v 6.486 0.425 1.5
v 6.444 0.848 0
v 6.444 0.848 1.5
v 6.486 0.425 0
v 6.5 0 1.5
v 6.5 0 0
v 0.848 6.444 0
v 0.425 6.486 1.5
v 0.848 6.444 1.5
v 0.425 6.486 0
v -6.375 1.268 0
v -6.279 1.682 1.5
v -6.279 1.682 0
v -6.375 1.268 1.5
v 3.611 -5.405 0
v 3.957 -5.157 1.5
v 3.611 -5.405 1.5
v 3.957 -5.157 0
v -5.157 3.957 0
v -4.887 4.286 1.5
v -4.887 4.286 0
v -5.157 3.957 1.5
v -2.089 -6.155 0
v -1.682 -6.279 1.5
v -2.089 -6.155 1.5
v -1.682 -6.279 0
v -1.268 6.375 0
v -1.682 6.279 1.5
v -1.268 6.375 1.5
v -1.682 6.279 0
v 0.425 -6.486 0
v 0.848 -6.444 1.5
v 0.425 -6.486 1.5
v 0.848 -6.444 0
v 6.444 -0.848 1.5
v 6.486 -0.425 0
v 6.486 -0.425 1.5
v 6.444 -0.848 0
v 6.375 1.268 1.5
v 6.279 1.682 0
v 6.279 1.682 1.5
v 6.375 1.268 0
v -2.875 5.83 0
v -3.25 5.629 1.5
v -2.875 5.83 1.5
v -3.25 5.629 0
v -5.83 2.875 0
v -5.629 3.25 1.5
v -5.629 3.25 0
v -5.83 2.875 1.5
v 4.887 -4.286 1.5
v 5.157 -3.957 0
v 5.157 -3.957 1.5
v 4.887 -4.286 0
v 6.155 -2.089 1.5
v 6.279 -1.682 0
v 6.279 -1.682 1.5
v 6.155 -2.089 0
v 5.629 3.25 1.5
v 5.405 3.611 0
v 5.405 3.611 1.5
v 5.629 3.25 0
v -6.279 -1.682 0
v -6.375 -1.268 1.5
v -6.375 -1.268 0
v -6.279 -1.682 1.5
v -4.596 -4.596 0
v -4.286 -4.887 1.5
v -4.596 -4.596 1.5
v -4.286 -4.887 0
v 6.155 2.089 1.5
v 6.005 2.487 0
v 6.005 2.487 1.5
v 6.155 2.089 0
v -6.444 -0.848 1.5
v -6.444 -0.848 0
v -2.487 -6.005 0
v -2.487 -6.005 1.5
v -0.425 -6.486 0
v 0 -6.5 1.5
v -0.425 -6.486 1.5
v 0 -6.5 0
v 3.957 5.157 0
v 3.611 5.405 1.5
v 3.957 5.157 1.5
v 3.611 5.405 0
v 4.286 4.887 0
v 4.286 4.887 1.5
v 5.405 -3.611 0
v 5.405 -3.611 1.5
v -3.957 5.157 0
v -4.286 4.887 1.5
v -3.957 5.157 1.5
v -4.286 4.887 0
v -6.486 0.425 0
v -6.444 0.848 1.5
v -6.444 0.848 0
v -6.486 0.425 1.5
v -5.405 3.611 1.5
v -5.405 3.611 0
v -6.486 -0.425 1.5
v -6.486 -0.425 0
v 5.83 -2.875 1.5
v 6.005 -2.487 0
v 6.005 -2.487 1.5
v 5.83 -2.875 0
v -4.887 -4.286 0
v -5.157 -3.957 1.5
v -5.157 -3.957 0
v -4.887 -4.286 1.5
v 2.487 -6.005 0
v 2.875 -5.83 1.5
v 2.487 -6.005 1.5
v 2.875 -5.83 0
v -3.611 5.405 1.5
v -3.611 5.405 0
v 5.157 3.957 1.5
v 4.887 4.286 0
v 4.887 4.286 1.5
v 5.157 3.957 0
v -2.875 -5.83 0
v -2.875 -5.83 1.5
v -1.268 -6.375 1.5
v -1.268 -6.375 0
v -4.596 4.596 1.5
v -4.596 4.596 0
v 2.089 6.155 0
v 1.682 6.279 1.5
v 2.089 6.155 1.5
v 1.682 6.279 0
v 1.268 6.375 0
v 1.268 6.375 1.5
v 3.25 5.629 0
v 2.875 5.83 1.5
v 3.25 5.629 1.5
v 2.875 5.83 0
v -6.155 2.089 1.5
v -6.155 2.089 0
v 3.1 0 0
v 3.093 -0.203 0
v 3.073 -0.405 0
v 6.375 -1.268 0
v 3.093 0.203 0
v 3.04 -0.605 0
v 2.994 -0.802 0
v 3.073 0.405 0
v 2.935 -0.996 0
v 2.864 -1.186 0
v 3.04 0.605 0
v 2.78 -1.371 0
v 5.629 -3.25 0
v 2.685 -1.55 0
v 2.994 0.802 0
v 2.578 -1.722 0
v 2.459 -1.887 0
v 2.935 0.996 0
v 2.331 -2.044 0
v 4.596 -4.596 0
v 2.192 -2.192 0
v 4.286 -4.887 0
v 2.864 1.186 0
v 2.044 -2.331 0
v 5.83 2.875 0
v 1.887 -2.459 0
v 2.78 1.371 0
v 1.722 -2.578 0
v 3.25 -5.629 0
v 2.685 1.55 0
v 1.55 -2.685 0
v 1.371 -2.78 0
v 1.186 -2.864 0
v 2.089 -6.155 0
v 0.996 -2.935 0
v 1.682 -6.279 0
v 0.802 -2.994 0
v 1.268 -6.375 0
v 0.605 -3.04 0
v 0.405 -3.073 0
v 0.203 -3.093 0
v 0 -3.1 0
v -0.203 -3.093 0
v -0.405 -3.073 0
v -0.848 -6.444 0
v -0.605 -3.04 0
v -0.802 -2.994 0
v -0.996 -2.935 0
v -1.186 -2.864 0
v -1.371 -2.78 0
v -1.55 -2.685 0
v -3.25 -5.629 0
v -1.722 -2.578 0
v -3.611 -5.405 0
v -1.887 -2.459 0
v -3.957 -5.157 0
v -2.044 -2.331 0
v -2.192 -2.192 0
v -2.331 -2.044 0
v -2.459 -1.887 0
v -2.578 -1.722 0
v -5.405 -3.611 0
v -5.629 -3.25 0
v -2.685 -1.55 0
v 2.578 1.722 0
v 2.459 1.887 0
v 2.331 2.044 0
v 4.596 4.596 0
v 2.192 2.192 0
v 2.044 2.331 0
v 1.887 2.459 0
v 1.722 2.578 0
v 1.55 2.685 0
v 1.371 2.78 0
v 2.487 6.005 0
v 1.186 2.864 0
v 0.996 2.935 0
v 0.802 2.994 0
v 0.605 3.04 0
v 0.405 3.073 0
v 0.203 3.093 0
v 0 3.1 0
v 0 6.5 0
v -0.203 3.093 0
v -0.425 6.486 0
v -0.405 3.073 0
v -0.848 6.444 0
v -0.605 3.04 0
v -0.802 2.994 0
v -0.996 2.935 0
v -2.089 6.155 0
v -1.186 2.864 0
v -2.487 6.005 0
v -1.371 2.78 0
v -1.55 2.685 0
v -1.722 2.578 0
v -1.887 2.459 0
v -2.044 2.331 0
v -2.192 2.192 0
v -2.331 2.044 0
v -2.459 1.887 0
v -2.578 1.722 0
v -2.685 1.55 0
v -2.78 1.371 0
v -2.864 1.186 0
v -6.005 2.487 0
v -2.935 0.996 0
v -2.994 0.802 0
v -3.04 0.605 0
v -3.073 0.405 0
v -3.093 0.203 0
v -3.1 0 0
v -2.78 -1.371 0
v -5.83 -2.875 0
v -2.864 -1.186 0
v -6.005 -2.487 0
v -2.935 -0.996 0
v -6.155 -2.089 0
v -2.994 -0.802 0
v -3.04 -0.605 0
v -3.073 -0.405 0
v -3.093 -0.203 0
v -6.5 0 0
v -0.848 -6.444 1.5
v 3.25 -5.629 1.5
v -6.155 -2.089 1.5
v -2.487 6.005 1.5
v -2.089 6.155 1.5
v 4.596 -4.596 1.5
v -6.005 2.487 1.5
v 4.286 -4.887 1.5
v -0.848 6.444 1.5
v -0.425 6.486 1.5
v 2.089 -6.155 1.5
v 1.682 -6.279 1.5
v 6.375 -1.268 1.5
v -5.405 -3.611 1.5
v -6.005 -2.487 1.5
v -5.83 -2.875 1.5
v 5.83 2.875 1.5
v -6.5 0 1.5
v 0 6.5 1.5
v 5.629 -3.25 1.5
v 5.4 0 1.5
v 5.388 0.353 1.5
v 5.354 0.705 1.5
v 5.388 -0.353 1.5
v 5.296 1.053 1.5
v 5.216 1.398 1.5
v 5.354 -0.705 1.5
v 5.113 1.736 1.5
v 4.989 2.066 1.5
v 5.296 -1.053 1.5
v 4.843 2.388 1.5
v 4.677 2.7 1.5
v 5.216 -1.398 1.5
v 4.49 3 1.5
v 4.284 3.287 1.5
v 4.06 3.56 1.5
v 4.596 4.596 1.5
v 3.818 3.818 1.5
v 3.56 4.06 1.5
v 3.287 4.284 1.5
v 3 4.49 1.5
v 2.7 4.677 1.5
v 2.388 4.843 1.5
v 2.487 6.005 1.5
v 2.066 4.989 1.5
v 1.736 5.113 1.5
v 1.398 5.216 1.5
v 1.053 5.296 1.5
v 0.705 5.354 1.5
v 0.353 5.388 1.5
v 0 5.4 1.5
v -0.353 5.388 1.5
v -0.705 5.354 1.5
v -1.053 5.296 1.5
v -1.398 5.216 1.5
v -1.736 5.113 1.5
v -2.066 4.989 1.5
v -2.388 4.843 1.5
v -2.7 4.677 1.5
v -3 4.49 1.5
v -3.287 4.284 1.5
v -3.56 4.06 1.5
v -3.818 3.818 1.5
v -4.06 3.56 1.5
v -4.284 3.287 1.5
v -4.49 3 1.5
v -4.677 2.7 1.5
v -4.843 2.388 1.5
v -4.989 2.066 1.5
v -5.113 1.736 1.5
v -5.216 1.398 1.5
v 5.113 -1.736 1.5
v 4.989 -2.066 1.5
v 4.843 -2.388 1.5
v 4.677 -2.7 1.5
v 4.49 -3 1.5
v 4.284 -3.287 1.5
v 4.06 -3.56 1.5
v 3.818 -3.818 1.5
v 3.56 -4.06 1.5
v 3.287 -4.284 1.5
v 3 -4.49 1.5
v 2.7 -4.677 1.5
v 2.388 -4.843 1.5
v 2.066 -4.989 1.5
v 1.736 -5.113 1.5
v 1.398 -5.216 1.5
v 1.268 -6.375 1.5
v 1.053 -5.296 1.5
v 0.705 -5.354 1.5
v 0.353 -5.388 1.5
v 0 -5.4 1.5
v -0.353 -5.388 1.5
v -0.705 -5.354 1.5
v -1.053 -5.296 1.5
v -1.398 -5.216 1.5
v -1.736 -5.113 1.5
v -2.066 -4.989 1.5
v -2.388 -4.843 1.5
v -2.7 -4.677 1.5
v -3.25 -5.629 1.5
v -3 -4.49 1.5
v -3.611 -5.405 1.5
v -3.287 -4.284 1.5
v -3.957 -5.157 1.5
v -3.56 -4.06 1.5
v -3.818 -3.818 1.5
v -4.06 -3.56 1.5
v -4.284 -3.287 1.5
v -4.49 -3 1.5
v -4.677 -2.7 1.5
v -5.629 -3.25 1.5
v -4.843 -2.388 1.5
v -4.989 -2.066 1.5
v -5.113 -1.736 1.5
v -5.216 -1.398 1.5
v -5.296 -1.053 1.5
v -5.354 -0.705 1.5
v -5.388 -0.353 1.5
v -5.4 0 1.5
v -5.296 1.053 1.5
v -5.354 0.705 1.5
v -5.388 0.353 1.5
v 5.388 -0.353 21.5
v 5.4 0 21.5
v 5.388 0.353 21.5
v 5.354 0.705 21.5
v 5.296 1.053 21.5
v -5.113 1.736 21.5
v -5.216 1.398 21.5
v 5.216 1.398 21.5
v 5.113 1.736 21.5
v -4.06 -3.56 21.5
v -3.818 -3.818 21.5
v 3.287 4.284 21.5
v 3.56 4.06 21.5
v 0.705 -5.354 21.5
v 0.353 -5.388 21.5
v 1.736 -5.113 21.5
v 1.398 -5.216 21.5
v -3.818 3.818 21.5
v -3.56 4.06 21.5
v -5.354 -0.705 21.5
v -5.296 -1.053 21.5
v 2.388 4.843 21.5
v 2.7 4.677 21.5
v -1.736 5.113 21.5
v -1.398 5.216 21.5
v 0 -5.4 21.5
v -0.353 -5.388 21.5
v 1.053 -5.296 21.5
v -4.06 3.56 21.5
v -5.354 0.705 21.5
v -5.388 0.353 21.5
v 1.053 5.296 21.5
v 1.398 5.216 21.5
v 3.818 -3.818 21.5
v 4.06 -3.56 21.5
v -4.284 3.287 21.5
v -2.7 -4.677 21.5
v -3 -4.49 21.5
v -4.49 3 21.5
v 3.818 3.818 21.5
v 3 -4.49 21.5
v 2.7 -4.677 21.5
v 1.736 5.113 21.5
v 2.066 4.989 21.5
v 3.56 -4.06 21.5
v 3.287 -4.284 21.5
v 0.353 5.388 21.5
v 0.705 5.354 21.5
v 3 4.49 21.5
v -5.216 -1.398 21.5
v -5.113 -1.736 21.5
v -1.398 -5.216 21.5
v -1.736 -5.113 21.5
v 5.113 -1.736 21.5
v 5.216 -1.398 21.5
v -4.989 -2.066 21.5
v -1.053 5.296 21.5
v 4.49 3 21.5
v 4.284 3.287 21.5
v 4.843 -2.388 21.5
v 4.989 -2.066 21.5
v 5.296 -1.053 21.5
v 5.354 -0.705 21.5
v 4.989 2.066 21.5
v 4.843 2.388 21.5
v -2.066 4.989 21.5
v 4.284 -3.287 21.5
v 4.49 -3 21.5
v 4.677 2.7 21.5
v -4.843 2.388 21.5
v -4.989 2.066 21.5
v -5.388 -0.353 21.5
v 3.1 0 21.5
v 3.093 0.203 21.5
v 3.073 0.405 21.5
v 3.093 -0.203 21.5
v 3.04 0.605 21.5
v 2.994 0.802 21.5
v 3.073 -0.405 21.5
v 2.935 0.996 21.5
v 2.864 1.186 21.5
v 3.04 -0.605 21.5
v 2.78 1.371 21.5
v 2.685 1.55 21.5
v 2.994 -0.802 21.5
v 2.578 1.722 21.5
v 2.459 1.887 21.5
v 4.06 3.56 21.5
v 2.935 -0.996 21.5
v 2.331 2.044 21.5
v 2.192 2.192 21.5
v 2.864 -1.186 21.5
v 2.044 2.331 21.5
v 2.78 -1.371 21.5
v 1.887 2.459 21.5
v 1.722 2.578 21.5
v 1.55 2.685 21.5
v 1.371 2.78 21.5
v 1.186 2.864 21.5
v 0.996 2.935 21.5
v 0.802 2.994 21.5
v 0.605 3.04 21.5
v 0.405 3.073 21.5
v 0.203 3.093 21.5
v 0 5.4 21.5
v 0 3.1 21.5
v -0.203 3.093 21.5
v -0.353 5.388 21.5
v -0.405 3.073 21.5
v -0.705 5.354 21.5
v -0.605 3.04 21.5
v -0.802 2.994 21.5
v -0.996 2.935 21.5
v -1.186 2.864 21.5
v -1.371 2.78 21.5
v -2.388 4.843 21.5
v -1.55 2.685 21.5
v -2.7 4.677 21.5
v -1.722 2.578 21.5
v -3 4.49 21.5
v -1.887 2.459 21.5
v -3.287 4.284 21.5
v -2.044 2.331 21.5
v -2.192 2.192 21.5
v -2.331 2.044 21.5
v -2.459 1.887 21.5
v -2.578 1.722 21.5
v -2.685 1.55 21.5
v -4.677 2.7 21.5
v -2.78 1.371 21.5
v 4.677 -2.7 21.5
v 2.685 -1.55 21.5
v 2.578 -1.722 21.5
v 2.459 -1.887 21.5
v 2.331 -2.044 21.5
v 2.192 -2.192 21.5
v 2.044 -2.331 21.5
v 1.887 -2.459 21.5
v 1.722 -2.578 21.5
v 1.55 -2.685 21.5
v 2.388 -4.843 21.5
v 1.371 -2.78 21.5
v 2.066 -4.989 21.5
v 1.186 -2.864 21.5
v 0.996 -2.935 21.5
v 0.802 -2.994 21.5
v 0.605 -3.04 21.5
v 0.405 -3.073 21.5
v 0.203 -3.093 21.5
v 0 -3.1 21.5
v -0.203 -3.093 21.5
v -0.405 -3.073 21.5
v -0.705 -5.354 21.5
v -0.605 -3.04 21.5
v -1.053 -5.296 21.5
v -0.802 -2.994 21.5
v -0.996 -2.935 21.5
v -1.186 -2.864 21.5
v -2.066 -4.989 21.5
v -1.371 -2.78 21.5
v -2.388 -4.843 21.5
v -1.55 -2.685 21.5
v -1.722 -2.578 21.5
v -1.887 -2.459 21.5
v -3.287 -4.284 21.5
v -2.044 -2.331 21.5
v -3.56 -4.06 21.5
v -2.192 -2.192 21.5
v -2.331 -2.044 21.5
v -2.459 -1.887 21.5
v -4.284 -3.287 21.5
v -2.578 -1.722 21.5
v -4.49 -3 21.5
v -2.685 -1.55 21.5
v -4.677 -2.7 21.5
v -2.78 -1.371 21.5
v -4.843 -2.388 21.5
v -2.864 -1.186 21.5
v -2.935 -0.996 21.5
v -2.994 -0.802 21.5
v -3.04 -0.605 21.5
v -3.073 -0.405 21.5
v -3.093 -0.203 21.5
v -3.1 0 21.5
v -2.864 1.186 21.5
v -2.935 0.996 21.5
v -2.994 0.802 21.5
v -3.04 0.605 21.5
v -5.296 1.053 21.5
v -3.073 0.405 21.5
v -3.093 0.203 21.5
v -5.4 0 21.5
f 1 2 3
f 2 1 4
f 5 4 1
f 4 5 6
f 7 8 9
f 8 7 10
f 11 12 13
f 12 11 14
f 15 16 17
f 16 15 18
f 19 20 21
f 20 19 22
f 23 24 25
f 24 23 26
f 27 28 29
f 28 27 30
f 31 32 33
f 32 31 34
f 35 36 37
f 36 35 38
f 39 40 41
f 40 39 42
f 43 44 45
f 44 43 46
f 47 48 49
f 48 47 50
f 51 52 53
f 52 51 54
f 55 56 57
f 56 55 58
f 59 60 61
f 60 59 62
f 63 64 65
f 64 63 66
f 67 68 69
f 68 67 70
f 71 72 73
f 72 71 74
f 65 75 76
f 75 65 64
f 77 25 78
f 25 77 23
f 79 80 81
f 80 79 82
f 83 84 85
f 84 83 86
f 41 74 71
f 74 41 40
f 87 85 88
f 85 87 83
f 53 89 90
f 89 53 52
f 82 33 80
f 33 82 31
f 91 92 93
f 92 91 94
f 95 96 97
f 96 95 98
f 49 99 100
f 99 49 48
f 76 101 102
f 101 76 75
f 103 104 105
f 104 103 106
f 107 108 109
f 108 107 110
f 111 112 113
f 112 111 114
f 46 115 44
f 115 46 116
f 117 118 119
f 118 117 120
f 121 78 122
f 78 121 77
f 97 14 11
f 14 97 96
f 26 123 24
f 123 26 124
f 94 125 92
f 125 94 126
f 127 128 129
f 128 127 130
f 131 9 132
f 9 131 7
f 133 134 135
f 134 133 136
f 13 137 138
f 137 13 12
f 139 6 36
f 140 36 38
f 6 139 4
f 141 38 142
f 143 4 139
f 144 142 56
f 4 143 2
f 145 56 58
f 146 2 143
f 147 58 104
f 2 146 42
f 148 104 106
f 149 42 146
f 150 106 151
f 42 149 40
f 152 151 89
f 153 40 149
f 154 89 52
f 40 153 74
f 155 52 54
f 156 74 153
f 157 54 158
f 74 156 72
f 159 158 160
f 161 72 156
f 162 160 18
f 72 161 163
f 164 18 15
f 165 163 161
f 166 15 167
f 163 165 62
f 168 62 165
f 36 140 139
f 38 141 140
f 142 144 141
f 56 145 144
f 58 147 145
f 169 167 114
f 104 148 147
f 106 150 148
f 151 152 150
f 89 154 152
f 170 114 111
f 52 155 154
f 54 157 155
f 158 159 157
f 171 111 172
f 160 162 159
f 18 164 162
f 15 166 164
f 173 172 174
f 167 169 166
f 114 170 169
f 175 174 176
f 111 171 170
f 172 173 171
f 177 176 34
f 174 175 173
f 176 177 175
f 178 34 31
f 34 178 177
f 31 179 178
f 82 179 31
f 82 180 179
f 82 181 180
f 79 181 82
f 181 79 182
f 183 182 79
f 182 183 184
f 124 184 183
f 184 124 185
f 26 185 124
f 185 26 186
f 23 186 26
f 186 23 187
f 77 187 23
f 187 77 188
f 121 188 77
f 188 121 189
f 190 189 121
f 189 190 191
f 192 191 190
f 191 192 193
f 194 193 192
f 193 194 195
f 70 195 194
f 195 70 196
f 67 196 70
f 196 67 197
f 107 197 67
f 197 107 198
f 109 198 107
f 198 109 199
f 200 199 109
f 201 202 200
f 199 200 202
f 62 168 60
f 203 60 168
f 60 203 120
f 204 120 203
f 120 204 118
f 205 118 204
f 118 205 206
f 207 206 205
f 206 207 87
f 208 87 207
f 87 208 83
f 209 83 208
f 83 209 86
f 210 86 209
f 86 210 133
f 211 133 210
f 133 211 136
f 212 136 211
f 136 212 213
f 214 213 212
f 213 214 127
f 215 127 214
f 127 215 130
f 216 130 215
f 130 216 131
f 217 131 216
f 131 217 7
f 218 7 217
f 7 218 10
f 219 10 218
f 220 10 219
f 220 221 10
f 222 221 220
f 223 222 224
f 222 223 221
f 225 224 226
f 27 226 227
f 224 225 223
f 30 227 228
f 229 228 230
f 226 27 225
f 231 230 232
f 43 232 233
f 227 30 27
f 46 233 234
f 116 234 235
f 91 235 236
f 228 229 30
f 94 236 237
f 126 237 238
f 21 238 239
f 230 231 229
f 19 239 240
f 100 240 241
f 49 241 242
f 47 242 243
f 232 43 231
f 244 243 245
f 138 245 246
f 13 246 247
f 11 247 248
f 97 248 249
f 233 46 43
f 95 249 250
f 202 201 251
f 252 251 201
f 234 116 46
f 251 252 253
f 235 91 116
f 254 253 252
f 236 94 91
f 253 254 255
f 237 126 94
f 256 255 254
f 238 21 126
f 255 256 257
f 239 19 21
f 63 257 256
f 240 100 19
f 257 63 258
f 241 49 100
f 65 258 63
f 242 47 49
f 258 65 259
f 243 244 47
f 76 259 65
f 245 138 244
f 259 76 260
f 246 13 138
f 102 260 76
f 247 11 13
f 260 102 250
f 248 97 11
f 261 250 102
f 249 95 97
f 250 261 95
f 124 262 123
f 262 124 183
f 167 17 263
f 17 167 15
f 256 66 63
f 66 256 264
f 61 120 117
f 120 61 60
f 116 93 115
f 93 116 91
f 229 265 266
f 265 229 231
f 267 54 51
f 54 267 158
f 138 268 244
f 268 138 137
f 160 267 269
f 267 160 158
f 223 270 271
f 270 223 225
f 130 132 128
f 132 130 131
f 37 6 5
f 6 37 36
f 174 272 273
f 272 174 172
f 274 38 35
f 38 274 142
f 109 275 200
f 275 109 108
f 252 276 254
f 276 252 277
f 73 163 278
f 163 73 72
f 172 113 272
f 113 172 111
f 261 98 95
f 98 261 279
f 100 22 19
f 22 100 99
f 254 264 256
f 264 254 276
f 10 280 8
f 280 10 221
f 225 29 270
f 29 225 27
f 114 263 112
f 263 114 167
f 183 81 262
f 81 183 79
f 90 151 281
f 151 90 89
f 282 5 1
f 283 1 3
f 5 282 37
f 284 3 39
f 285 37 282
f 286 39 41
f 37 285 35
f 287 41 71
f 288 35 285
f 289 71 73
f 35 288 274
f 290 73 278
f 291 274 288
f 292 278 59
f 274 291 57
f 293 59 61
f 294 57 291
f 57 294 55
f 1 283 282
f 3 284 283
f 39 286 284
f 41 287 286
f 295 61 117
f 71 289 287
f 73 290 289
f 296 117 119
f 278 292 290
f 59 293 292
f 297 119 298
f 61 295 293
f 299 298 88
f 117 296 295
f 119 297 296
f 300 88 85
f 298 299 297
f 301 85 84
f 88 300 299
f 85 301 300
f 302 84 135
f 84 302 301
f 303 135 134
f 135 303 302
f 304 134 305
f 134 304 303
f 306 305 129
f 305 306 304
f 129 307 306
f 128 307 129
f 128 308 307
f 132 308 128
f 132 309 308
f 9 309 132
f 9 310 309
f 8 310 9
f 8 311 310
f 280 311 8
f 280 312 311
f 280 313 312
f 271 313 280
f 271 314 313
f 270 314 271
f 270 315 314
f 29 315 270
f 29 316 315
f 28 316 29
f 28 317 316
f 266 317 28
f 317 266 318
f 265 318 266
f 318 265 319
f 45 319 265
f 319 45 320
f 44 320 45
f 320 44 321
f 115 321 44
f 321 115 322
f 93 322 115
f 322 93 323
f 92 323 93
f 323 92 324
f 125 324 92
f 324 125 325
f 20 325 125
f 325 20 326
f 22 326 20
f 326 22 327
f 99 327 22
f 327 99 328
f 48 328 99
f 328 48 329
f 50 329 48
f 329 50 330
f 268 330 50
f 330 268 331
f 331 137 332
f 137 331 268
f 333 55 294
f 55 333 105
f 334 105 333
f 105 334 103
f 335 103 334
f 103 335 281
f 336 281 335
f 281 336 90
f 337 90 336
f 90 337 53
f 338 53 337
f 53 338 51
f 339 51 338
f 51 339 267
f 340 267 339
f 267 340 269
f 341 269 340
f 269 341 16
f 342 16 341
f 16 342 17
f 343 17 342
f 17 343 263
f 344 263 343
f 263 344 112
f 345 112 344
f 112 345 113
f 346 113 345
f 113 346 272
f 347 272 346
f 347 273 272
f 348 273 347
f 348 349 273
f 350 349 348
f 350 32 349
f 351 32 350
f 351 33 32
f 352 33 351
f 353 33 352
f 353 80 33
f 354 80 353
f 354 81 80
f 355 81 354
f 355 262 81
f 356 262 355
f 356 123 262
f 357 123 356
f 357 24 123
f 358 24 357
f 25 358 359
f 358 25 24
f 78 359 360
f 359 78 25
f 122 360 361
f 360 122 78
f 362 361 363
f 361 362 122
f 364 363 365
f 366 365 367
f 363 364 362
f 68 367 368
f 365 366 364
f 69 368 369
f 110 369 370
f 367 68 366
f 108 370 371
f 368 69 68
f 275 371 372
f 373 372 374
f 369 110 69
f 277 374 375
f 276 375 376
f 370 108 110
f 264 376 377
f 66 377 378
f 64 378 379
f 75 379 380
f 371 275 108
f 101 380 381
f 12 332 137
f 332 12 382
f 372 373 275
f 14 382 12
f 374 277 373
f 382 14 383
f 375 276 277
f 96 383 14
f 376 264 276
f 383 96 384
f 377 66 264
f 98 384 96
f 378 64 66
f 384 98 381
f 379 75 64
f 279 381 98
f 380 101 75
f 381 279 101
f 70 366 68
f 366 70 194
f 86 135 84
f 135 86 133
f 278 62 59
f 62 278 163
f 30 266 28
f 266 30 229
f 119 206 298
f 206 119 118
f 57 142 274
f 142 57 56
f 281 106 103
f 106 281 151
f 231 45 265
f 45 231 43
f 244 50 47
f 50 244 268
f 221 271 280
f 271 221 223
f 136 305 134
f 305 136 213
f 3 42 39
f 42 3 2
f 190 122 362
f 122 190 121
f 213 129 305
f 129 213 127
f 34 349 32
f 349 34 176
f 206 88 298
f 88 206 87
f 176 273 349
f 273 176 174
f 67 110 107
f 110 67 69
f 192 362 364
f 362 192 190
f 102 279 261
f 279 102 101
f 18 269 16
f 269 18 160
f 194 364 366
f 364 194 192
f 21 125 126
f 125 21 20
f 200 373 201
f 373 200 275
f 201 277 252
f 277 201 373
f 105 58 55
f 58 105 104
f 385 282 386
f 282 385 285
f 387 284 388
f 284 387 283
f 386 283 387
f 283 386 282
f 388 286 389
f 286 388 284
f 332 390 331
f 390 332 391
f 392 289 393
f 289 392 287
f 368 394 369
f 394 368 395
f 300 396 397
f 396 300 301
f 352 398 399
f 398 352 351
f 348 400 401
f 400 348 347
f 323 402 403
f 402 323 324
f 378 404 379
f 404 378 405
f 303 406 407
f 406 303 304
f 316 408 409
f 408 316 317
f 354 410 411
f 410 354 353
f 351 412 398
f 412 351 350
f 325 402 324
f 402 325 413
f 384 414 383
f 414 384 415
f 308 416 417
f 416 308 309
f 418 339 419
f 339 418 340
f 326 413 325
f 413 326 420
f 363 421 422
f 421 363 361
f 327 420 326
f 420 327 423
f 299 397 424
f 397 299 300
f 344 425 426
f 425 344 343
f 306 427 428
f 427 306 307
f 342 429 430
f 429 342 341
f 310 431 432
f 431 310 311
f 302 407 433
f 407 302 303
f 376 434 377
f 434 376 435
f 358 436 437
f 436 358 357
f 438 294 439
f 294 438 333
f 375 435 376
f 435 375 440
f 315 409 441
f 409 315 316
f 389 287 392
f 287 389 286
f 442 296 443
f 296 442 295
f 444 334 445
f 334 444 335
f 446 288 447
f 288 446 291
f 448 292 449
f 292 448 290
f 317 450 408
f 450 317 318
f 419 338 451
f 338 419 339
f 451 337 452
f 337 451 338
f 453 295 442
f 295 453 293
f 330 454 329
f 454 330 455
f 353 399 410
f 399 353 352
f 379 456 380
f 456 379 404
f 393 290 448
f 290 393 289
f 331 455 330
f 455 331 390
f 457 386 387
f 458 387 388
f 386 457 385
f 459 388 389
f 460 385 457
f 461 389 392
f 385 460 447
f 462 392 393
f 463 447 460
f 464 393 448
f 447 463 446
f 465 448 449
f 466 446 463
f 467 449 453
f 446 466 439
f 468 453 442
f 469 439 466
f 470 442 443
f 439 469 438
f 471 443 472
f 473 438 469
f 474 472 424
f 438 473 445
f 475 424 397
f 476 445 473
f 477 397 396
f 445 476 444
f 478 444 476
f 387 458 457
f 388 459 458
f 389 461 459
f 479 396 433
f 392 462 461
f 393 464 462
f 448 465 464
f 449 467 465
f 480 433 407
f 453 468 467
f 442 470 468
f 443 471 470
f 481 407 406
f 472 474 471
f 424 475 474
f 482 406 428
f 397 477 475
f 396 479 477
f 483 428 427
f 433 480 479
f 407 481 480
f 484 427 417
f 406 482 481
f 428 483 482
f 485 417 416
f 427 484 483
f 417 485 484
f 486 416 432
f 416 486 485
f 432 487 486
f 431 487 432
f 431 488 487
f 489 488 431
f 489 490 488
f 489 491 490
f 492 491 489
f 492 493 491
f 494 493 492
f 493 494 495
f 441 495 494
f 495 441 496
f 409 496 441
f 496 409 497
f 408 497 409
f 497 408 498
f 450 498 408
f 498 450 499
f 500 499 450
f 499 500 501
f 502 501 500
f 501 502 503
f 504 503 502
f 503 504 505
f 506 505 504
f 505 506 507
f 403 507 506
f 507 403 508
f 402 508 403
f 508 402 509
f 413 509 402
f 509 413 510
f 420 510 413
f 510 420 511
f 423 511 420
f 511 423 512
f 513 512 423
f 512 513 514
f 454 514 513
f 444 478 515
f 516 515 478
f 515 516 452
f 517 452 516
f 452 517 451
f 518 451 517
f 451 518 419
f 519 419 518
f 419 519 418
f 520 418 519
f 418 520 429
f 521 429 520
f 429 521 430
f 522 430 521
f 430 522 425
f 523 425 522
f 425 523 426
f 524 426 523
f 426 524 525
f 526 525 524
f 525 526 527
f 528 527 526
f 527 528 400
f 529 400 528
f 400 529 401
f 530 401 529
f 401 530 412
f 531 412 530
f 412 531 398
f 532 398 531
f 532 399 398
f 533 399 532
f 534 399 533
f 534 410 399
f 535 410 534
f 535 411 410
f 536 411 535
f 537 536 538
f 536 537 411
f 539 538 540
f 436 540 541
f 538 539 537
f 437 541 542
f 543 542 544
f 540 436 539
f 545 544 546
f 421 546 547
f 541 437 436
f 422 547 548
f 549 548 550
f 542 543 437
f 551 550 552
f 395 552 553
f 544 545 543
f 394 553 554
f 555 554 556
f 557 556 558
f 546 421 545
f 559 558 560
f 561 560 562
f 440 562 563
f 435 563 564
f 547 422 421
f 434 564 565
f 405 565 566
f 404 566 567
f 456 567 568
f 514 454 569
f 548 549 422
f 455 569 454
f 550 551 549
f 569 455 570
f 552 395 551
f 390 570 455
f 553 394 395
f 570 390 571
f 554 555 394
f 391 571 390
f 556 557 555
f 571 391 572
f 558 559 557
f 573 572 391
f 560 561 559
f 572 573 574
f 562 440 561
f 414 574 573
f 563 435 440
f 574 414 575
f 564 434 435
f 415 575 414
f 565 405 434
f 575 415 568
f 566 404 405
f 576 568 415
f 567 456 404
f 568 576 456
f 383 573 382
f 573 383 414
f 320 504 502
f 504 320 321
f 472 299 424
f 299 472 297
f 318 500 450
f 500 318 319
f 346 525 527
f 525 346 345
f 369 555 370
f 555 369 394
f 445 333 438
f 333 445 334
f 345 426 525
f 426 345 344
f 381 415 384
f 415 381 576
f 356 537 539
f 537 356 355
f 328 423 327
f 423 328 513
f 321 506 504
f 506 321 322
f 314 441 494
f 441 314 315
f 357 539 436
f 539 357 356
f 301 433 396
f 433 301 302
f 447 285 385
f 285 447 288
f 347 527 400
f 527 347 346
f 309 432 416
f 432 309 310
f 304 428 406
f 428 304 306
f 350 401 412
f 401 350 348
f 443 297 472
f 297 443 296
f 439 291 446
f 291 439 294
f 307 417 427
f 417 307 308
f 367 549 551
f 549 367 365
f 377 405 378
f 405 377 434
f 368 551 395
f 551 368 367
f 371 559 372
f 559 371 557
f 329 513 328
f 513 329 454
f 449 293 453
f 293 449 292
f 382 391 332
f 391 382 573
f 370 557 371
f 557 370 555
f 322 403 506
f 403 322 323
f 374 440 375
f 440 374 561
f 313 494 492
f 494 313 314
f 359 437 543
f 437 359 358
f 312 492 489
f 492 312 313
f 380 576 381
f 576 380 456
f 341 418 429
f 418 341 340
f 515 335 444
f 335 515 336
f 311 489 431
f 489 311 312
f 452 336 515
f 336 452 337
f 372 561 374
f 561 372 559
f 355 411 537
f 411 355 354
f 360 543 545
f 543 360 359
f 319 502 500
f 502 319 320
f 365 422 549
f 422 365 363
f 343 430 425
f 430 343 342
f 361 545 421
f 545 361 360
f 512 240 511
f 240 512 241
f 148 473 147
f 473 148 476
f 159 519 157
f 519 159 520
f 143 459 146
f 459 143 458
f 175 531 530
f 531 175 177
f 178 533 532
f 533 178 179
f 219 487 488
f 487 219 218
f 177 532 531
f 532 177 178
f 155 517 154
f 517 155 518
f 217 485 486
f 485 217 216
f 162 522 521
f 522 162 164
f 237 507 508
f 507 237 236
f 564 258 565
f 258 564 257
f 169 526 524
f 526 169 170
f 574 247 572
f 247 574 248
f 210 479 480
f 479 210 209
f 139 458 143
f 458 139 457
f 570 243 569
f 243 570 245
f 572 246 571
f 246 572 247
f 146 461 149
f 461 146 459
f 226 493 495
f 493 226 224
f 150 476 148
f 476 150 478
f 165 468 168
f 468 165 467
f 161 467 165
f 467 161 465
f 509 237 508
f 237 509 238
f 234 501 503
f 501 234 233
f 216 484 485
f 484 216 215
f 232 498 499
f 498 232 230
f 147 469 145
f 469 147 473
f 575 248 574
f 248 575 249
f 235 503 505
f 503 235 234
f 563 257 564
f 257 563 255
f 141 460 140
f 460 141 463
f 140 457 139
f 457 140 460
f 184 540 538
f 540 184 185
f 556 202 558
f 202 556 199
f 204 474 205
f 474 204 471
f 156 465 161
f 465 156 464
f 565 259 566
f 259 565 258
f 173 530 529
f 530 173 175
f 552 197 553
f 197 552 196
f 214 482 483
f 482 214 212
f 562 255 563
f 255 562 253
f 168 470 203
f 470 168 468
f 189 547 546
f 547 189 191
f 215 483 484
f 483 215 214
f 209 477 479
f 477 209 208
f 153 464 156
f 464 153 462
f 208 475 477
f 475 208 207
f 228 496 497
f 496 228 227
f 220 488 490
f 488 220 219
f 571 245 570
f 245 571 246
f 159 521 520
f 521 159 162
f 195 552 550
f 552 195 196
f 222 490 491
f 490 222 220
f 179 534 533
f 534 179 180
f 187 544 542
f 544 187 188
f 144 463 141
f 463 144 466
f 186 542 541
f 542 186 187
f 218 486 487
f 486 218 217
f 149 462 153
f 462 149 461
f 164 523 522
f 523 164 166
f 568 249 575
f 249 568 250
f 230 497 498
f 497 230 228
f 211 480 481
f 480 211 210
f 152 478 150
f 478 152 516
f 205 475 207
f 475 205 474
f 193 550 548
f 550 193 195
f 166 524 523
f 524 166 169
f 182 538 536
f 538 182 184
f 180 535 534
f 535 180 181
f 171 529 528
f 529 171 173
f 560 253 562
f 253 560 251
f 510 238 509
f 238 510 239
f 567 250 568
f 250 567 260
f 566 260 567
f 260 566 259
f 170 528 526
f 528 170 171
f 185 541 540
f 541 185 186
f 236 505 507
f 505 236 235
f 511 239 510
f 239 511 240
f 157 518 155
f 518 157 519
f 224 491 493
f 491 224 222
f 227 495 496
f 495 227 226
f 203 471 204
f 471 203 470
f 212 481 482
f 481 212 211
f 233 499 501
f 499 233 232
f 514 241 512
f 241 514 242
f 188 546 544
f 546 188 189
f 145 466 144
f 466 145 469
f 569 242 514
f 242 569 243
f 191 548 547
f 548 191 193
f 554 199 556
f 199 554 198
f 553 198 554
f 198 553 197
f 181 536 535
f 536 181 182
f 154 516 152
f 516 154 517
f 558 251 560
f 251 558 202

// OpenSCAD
// PCR tube adapter sleeve: fits a 0.2 mL tube into a 1.5 mL rack hole
// Print orientation: collar on the bed (z = 0), sleeve body rises to z = 21.5

// ---------------- Parameters ----------------
collar_d      = 13;    // collar outer diameter (mm)
collar_h      = 1.5;   // collar thickness (mm)
sleeve_od     = 10.8;  // sleeve body outer diameter (mm)
sleeve_h      = 20;    // sleeve body height above collar (mm)
bore_d        = 6.2;   // straight through-bore diameter (mm)
eps           = 0.5;   // cutter overshoot past faces (mm)

$fn = 96;              // facet count for round features

// ---------------- Derived ----------------
sleeve_top_z   = collar_h + sleeve_h;   // 21.5 mm overall height

// ---------------- Model ----------------
difference() {
    union() {
        // Collar
        cylinder(d = collar_d, h = collar_h);

        // Sleeve body (slightly overlapping the collar for a clean union)
        translate([0, 0, collar_h - 0.01])
            cylinder(d = sleeve_od, h = sleeve_h + 0.01);
    }

    // Full-height straight bore, open at both ends
    translate([0, 0, -eps])
        cylinder(d = bore_d, h = sleeve_top_z + 2 * eps);
}
